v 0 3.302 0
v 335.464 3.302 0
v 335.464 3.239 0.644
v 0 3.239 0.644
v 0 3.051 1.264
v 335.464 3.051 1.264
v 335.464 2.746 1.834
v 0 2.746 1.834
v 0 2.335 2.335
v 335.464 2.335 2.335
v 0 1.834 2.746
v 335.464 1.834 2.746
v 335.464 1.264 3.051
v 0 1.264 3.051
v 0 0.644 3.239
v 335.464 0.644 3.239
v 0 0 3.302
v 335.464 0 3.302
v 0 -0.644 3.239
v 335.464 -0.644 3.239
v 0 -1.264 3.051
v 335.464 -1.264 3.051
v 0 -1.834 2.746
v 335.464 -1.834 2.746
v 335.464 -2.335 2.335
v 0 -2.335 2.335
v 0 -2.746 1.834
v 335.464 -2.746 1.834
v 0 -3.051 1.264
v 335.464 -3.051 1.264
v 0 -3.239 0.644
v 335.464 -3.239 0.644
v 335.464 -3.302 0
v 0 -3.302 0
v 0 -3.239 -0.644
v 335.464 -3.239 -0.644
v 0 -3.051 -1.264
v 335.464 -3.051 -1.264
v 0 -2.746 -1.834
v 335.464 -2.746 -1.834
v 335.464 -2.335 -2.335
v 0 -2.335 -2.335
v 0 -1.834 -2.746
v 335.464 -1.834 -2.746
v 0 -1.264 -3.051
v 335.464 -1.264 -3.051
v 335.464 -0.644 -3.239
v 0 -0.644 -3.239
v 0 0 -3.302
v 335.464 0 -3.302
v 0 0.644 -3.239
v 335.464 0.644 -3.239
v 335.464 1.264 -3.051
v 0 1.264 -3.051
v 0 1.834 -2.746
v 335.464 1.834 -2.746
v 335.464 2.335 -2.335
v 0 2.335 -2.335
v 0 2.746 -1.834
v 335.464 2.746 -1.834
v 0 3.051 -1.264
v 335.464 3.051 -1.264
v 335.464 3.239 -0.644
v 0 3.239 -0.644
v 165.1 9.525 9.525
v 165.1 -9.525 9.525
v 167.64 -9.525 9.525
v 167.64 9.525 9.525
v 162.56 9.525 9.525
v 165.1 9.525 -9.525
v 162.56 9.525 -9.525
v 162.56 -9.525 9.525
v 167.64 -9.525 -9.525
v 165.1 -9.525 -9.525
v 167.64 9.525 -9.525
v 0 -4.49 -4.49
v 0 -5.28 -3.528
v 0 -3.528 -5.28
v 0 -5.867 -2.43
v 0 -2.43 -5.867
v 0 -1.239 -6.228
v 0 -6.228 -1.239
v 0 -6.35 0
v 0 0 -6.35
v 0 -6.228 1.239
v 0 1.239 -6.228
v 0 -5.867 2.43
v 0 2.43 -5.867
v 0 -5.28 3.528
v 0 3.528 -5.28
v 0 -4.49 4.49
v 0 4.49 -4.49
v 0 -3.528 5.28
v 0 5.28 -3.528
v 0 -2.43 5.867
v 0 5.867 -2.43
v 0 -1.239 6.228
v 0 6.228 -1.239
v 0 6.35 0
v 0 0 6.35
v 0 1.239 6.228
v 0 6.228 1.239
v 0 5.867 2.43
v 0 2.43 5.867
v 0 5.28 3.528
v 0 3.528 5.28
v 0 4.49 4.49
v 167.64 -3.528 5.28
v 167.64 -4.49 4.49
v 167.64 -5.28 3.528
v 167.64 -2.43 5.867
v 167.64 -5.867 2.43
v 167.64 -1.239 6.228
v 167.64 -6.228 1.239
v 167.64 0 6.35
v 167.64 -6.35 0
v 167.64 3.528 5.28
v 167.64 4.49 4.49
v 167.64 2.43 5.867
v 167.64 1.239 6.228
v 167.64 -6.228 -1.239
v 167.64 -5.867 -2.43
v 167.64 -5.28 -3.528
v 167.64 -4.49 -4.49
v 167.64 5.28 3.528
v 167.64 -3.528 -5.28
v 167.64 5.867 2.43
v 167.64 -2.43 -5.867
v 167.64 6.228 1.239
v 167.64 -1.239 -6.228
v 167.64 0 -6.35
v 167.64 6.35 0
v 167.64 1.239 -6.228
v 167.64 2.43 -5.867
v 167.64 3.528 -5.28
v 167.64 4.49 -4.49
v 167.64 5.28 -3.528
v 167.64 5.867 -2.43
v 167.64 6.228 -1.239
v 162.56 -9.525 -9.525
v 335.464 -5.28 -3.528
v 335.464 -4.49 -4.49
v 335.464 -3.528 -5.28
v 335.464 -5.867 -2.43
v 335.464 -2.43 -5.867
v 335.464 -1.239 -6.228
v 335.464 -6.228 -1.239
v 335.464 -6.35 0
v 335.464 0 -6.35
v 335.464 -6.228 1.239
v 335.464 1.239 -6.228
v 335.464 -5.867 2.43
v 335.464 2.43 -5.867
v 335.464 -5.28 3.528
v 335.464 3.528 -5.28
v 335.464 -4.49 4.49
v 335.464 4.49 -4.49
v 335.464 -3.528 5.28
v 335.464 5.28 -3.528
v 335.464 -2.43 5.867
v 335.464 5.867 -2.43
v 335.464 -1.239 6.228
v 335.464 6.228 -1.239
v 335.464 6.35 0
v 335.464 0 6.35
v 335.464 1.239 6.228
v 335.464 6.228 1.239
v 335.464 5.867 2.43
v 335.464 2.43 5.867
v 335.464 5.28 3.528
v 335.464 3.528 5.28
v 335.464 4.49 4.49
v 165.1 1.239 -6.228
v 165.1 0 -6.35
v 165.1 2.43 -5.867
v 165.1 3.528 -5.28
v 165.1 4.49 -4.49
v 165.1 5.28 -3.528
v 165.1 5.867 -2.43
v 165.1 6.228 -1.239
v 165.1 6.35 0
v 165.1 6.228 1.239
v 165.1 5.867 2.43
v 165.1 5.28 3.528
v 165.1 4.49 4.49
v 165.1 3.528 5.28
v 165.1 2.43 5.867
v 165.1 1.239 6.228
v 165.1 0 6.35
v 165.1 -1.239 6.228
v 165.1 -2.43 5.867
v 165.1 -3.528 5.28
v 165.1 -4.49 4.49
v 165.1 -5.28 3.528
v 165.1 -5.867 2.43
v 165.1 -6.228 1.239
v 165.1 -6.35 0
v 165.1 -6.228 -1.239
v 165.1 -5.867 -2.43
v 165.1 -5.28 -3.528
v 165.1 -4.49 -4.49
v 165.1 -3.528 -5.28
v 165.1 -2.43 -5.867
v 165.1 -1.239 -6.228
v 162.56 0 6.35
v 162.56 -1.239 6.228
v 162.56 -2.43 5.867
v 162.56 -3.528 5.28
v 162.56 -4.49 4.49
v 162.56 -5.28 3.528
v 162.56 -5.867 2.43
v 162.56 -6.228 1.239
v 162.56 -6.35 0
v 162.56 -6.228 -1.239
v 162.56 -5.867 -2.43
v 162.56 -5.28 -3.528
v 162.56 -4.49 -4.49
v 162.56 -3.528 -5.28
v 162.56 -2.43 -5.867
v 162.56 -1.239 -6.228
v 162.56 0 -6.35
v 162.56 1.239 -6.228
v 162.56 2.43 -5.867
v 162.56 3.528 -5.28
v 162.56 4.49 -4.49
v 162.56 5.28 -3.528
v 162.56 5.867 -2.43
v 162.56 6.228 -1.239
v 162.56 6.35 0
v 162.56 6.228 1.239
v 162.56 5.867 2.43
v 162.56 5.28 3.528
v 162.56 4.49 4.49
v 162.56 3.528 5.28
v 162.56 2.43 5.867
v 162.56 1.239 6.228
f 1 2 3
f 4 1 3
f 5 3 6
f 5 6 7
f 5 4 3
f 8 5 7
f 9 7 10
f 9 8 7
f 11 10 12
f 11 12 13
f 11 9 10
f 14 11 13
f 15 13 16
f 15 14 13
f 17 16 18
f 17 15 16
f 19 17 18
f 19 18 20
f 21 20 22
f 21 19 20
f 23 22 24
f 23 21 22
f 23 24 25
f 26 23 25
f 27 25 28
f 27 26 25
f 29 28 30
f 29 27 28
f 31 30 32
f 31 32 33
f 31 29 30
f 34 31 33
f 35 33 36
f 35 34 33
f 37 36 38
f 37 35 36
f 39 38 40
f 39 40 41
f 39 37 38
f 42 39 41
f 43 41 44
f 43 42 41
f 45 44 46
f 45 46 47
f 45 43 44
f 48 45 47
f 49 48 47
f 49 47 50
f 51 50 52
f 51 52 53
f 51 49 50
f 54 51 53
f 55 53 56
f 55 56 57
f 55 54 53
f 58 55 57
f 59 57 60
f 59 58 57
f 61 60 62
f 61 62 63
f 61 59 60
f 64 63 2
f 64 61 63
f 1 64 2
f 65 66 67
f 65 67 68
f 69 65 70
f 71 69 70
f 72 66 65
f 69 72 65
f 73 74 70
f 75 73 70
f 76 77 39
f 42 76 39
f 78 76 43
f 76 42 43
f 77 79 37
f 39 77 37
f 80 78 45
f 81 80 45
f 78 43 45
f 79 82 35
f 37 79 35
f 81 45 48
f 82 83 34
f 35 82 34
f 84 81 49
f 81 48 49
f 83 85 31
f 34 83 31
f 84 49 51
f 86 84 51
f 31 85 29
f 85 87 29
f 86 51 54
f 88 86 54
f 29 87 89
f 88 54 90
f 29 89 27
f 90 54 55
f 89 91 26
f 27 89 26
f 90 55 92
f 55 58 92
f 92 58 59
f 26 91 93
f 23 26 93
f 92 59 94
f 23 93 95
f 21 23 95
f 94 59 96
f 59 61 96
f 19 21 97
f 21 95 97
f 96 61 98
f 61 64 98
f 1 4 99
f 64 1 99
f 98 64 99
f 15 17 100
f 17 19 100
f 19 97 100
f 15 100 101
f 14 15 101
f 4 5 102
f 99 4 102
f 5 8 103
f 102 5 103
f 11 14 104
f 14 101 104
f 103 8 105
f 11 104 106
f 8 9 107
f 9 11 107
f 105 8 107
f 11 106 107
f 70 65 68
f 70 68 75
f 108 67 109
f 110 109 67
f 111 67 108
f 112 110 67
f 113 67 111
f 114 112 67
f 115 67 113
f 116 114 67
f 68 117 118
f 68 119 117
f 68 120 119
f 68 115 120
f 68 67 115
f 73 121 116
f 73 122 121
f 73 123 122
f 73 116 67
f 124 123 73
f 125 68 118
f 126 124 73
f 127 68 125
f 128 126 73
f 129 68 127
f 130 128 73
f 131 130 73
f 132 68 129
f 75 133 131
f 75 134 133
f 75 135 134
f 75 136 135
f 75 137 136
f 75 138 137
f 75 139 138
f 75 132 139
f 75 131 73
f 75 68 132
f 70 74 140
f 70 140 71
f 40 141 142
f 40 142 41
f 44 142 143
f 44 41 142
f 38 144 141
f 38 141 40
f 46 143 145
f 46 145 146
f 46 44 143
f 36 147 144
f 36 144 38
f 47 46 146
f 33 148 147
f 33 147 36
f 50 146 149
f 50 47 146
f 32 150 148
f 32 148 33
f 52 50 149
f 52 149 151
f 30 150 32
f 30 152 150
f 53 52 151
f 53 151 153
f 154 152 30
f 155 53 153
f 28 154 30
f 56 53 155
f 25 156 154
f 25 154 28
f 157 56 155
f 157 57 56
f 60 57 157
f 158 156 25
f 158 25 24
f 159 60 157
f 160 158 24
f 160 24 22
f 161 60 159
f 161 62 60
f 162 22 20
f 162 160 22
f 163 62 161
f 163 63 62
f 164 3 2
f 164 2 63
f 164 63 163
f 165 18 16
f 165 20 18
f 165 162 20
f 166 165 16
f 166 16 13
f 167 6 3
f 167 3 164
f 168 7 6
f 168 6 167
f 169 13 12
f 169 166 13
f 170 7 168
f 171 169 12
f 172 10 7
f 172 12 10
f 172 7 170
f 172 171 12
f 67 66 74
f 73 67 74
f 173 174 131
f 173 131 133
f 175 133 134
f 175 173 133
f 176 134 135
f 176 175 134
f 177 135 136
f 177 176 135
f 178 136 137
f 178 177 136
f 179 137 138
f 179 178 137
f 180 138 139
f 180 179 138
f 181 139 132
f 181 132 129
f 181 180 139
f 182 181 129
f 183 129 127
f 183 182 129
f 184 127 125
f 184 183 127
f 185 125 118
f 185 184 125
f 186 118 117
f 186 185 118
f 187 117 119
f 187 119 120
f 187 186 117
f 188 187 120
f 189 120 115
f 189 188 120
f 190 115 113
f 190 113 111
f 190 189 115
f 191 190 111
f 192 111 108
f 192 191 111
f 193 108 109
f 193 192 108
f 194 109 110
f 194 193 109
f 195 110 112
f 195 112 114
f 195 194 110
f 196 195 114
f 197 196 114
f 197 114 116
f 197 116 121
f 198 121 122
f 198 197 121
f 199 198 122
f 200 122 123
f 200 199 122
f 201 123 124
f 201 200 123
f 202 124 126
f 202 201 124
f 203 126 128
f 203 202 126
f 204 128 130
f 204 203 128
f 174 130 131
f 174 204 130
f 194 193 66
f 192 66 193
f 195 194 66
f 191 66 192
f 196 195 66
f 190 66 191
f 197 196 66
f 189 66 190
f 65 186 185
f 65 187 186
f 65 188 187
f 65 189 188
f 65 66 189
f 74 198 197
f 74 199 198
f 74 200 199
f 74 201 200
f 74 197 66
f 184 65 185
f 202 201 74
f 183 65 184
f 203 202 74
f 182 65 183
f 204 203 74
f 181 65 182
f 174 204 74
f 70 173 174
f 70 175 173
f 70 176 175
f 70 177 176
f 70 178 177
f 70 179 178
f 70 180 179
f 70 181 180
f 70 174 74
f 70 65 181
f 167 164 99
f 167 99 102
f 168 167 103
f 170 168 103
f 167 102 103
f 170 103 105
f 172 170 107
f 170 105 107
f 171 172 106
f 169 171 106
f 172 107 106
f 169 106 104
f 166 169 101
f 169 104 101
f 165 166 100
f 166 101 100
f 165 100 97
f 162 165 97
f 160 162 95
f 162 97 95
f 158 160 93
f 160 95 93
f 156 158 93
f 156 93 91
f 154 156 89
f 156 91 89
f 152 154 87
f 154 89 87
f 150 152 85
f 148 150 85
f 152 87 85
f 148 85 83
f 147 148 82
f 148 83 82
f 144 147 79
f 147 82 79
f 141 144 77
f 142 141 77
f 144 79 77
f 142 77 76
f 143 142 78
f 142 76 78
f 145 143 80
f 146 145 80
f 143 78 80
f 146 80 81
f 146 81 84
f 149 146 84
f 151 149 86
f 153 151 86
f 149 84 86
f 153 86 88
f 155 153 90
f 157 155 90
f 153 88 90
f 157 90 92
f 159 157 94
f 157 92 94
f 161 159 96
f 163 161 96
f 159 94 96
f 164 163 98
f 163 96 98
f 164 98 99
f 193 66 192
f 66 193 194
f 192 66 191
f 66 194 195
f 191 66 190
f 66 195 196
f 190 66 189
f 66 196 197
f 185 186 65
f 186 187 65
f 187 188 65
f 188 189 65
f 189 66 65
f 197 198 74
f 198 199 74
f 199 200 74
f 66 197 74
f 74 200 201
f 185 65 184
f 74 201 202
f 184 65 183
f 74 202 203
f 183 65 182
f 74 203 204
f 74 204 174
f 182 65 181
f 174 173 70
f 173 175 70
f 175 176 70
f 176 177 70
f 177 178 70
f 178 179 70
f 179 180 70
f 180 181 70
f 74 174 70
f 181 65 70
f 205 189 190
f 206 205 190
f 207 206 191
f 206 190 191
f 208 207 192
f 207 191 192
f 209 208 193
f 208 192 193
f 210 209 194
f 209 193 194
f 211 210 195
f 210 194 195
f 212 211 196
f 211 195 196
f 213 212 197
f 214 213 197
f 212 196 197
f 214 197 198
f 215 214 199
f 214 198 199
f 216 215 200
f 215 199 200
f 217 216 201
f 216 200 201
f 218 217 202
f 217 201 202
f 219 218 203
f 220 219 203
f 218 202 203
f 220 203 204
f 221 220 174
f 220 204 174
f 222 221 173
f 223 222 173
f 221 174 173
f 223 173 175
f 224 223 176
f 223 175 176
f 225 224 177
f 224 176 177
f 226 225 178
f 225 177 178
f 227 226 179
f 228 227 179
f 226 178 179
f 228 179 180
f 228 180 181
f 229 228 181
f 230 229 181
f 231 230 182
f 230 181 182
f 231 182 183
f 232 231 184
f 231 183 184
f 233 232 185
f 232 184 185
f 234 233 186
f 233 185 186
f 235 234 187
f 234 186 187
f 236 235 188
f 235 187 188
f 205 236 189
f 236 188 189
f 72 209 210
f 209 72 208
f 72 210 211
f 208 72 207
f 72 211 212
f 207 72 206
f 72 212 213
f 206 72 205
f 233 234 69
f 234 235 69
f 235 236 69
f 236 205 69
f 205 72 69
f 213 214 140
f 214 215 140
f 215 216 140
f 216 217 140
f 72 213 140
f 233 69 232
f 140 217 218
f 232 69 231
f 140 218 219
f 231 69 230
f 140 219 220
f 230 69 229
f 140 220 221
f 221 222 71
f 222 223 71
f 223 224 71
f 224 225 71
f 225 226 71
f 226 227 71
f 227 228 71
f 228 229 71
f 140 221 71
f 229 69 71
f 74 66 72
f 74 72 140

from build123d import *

# Parameters (mm, degrees)
SKETCH11_R            = 6.35
SKETCH11_R_2          = 3.302
PULL_ROD_MEMBER_DEPTH = 335.464234074
PULL_START            = 165.1
SKETCH12_W            = 19.05
SKETCH12_H            = 19.05
SKETCH12_R            = 6.35
PULL_ROD_NUT_1_DEPTH  = 2.54
SKETCH14_W            = 19.05
SKETCH14_H            = 19.05
SKETCH14_R            = 6.35
PULL_ROD_NUT_2_DEPTH  = 2.54


with BuildPart() as part:
    # Sketch11 → Pull Rod Member (new body)
    with BuildSketch(Plane.YZ):
        Circle(SKETCH11_R)
        Circle(SKETCH11_R_2, mode=Mode.SUBTRACT)
    extrude(amount=PULL_ROD_MEMBER_DEPTH)


with BuildPart() as body_2:
    # Sketch12 → Pull Rod Nut 1 (new body)
    with BuildSketch(Plane(origin=(0, 0, 0), x_dir=(0, 0, -1), z_dir=(1, 0, 0)).offset(PULL_START)):
        Rectangle(SKETCH12_W, SKETCH12_H)
        Circle(SKETCH12_R, mode=Mode.SUBTRACT)
    extrude(amount=PULL_ROD_NUT_1_DEPTH)


with BuildPart() as body_3:
    # Sketch14 → Pull Rod Nut 2 (new body)
    with BuildSketch(Plane(origin=(0, 0, 0), x_dir=(0, 0, -1), z_dir=(1, 0, 0)).offset(PULL_START)):
        Rectangle(SKETCH14_W, SKETCH14_H)
        with Locations(Location((0, 0, 0), (0, 0, 180))):
            Circle(SKETCH14_R, mode=Mode.SUBTRACT)
    extrude(amount=-PULL_ROD_NUT_2_DEPTH)


solid = Compound([part.part, body_2.part, body_3.part])
